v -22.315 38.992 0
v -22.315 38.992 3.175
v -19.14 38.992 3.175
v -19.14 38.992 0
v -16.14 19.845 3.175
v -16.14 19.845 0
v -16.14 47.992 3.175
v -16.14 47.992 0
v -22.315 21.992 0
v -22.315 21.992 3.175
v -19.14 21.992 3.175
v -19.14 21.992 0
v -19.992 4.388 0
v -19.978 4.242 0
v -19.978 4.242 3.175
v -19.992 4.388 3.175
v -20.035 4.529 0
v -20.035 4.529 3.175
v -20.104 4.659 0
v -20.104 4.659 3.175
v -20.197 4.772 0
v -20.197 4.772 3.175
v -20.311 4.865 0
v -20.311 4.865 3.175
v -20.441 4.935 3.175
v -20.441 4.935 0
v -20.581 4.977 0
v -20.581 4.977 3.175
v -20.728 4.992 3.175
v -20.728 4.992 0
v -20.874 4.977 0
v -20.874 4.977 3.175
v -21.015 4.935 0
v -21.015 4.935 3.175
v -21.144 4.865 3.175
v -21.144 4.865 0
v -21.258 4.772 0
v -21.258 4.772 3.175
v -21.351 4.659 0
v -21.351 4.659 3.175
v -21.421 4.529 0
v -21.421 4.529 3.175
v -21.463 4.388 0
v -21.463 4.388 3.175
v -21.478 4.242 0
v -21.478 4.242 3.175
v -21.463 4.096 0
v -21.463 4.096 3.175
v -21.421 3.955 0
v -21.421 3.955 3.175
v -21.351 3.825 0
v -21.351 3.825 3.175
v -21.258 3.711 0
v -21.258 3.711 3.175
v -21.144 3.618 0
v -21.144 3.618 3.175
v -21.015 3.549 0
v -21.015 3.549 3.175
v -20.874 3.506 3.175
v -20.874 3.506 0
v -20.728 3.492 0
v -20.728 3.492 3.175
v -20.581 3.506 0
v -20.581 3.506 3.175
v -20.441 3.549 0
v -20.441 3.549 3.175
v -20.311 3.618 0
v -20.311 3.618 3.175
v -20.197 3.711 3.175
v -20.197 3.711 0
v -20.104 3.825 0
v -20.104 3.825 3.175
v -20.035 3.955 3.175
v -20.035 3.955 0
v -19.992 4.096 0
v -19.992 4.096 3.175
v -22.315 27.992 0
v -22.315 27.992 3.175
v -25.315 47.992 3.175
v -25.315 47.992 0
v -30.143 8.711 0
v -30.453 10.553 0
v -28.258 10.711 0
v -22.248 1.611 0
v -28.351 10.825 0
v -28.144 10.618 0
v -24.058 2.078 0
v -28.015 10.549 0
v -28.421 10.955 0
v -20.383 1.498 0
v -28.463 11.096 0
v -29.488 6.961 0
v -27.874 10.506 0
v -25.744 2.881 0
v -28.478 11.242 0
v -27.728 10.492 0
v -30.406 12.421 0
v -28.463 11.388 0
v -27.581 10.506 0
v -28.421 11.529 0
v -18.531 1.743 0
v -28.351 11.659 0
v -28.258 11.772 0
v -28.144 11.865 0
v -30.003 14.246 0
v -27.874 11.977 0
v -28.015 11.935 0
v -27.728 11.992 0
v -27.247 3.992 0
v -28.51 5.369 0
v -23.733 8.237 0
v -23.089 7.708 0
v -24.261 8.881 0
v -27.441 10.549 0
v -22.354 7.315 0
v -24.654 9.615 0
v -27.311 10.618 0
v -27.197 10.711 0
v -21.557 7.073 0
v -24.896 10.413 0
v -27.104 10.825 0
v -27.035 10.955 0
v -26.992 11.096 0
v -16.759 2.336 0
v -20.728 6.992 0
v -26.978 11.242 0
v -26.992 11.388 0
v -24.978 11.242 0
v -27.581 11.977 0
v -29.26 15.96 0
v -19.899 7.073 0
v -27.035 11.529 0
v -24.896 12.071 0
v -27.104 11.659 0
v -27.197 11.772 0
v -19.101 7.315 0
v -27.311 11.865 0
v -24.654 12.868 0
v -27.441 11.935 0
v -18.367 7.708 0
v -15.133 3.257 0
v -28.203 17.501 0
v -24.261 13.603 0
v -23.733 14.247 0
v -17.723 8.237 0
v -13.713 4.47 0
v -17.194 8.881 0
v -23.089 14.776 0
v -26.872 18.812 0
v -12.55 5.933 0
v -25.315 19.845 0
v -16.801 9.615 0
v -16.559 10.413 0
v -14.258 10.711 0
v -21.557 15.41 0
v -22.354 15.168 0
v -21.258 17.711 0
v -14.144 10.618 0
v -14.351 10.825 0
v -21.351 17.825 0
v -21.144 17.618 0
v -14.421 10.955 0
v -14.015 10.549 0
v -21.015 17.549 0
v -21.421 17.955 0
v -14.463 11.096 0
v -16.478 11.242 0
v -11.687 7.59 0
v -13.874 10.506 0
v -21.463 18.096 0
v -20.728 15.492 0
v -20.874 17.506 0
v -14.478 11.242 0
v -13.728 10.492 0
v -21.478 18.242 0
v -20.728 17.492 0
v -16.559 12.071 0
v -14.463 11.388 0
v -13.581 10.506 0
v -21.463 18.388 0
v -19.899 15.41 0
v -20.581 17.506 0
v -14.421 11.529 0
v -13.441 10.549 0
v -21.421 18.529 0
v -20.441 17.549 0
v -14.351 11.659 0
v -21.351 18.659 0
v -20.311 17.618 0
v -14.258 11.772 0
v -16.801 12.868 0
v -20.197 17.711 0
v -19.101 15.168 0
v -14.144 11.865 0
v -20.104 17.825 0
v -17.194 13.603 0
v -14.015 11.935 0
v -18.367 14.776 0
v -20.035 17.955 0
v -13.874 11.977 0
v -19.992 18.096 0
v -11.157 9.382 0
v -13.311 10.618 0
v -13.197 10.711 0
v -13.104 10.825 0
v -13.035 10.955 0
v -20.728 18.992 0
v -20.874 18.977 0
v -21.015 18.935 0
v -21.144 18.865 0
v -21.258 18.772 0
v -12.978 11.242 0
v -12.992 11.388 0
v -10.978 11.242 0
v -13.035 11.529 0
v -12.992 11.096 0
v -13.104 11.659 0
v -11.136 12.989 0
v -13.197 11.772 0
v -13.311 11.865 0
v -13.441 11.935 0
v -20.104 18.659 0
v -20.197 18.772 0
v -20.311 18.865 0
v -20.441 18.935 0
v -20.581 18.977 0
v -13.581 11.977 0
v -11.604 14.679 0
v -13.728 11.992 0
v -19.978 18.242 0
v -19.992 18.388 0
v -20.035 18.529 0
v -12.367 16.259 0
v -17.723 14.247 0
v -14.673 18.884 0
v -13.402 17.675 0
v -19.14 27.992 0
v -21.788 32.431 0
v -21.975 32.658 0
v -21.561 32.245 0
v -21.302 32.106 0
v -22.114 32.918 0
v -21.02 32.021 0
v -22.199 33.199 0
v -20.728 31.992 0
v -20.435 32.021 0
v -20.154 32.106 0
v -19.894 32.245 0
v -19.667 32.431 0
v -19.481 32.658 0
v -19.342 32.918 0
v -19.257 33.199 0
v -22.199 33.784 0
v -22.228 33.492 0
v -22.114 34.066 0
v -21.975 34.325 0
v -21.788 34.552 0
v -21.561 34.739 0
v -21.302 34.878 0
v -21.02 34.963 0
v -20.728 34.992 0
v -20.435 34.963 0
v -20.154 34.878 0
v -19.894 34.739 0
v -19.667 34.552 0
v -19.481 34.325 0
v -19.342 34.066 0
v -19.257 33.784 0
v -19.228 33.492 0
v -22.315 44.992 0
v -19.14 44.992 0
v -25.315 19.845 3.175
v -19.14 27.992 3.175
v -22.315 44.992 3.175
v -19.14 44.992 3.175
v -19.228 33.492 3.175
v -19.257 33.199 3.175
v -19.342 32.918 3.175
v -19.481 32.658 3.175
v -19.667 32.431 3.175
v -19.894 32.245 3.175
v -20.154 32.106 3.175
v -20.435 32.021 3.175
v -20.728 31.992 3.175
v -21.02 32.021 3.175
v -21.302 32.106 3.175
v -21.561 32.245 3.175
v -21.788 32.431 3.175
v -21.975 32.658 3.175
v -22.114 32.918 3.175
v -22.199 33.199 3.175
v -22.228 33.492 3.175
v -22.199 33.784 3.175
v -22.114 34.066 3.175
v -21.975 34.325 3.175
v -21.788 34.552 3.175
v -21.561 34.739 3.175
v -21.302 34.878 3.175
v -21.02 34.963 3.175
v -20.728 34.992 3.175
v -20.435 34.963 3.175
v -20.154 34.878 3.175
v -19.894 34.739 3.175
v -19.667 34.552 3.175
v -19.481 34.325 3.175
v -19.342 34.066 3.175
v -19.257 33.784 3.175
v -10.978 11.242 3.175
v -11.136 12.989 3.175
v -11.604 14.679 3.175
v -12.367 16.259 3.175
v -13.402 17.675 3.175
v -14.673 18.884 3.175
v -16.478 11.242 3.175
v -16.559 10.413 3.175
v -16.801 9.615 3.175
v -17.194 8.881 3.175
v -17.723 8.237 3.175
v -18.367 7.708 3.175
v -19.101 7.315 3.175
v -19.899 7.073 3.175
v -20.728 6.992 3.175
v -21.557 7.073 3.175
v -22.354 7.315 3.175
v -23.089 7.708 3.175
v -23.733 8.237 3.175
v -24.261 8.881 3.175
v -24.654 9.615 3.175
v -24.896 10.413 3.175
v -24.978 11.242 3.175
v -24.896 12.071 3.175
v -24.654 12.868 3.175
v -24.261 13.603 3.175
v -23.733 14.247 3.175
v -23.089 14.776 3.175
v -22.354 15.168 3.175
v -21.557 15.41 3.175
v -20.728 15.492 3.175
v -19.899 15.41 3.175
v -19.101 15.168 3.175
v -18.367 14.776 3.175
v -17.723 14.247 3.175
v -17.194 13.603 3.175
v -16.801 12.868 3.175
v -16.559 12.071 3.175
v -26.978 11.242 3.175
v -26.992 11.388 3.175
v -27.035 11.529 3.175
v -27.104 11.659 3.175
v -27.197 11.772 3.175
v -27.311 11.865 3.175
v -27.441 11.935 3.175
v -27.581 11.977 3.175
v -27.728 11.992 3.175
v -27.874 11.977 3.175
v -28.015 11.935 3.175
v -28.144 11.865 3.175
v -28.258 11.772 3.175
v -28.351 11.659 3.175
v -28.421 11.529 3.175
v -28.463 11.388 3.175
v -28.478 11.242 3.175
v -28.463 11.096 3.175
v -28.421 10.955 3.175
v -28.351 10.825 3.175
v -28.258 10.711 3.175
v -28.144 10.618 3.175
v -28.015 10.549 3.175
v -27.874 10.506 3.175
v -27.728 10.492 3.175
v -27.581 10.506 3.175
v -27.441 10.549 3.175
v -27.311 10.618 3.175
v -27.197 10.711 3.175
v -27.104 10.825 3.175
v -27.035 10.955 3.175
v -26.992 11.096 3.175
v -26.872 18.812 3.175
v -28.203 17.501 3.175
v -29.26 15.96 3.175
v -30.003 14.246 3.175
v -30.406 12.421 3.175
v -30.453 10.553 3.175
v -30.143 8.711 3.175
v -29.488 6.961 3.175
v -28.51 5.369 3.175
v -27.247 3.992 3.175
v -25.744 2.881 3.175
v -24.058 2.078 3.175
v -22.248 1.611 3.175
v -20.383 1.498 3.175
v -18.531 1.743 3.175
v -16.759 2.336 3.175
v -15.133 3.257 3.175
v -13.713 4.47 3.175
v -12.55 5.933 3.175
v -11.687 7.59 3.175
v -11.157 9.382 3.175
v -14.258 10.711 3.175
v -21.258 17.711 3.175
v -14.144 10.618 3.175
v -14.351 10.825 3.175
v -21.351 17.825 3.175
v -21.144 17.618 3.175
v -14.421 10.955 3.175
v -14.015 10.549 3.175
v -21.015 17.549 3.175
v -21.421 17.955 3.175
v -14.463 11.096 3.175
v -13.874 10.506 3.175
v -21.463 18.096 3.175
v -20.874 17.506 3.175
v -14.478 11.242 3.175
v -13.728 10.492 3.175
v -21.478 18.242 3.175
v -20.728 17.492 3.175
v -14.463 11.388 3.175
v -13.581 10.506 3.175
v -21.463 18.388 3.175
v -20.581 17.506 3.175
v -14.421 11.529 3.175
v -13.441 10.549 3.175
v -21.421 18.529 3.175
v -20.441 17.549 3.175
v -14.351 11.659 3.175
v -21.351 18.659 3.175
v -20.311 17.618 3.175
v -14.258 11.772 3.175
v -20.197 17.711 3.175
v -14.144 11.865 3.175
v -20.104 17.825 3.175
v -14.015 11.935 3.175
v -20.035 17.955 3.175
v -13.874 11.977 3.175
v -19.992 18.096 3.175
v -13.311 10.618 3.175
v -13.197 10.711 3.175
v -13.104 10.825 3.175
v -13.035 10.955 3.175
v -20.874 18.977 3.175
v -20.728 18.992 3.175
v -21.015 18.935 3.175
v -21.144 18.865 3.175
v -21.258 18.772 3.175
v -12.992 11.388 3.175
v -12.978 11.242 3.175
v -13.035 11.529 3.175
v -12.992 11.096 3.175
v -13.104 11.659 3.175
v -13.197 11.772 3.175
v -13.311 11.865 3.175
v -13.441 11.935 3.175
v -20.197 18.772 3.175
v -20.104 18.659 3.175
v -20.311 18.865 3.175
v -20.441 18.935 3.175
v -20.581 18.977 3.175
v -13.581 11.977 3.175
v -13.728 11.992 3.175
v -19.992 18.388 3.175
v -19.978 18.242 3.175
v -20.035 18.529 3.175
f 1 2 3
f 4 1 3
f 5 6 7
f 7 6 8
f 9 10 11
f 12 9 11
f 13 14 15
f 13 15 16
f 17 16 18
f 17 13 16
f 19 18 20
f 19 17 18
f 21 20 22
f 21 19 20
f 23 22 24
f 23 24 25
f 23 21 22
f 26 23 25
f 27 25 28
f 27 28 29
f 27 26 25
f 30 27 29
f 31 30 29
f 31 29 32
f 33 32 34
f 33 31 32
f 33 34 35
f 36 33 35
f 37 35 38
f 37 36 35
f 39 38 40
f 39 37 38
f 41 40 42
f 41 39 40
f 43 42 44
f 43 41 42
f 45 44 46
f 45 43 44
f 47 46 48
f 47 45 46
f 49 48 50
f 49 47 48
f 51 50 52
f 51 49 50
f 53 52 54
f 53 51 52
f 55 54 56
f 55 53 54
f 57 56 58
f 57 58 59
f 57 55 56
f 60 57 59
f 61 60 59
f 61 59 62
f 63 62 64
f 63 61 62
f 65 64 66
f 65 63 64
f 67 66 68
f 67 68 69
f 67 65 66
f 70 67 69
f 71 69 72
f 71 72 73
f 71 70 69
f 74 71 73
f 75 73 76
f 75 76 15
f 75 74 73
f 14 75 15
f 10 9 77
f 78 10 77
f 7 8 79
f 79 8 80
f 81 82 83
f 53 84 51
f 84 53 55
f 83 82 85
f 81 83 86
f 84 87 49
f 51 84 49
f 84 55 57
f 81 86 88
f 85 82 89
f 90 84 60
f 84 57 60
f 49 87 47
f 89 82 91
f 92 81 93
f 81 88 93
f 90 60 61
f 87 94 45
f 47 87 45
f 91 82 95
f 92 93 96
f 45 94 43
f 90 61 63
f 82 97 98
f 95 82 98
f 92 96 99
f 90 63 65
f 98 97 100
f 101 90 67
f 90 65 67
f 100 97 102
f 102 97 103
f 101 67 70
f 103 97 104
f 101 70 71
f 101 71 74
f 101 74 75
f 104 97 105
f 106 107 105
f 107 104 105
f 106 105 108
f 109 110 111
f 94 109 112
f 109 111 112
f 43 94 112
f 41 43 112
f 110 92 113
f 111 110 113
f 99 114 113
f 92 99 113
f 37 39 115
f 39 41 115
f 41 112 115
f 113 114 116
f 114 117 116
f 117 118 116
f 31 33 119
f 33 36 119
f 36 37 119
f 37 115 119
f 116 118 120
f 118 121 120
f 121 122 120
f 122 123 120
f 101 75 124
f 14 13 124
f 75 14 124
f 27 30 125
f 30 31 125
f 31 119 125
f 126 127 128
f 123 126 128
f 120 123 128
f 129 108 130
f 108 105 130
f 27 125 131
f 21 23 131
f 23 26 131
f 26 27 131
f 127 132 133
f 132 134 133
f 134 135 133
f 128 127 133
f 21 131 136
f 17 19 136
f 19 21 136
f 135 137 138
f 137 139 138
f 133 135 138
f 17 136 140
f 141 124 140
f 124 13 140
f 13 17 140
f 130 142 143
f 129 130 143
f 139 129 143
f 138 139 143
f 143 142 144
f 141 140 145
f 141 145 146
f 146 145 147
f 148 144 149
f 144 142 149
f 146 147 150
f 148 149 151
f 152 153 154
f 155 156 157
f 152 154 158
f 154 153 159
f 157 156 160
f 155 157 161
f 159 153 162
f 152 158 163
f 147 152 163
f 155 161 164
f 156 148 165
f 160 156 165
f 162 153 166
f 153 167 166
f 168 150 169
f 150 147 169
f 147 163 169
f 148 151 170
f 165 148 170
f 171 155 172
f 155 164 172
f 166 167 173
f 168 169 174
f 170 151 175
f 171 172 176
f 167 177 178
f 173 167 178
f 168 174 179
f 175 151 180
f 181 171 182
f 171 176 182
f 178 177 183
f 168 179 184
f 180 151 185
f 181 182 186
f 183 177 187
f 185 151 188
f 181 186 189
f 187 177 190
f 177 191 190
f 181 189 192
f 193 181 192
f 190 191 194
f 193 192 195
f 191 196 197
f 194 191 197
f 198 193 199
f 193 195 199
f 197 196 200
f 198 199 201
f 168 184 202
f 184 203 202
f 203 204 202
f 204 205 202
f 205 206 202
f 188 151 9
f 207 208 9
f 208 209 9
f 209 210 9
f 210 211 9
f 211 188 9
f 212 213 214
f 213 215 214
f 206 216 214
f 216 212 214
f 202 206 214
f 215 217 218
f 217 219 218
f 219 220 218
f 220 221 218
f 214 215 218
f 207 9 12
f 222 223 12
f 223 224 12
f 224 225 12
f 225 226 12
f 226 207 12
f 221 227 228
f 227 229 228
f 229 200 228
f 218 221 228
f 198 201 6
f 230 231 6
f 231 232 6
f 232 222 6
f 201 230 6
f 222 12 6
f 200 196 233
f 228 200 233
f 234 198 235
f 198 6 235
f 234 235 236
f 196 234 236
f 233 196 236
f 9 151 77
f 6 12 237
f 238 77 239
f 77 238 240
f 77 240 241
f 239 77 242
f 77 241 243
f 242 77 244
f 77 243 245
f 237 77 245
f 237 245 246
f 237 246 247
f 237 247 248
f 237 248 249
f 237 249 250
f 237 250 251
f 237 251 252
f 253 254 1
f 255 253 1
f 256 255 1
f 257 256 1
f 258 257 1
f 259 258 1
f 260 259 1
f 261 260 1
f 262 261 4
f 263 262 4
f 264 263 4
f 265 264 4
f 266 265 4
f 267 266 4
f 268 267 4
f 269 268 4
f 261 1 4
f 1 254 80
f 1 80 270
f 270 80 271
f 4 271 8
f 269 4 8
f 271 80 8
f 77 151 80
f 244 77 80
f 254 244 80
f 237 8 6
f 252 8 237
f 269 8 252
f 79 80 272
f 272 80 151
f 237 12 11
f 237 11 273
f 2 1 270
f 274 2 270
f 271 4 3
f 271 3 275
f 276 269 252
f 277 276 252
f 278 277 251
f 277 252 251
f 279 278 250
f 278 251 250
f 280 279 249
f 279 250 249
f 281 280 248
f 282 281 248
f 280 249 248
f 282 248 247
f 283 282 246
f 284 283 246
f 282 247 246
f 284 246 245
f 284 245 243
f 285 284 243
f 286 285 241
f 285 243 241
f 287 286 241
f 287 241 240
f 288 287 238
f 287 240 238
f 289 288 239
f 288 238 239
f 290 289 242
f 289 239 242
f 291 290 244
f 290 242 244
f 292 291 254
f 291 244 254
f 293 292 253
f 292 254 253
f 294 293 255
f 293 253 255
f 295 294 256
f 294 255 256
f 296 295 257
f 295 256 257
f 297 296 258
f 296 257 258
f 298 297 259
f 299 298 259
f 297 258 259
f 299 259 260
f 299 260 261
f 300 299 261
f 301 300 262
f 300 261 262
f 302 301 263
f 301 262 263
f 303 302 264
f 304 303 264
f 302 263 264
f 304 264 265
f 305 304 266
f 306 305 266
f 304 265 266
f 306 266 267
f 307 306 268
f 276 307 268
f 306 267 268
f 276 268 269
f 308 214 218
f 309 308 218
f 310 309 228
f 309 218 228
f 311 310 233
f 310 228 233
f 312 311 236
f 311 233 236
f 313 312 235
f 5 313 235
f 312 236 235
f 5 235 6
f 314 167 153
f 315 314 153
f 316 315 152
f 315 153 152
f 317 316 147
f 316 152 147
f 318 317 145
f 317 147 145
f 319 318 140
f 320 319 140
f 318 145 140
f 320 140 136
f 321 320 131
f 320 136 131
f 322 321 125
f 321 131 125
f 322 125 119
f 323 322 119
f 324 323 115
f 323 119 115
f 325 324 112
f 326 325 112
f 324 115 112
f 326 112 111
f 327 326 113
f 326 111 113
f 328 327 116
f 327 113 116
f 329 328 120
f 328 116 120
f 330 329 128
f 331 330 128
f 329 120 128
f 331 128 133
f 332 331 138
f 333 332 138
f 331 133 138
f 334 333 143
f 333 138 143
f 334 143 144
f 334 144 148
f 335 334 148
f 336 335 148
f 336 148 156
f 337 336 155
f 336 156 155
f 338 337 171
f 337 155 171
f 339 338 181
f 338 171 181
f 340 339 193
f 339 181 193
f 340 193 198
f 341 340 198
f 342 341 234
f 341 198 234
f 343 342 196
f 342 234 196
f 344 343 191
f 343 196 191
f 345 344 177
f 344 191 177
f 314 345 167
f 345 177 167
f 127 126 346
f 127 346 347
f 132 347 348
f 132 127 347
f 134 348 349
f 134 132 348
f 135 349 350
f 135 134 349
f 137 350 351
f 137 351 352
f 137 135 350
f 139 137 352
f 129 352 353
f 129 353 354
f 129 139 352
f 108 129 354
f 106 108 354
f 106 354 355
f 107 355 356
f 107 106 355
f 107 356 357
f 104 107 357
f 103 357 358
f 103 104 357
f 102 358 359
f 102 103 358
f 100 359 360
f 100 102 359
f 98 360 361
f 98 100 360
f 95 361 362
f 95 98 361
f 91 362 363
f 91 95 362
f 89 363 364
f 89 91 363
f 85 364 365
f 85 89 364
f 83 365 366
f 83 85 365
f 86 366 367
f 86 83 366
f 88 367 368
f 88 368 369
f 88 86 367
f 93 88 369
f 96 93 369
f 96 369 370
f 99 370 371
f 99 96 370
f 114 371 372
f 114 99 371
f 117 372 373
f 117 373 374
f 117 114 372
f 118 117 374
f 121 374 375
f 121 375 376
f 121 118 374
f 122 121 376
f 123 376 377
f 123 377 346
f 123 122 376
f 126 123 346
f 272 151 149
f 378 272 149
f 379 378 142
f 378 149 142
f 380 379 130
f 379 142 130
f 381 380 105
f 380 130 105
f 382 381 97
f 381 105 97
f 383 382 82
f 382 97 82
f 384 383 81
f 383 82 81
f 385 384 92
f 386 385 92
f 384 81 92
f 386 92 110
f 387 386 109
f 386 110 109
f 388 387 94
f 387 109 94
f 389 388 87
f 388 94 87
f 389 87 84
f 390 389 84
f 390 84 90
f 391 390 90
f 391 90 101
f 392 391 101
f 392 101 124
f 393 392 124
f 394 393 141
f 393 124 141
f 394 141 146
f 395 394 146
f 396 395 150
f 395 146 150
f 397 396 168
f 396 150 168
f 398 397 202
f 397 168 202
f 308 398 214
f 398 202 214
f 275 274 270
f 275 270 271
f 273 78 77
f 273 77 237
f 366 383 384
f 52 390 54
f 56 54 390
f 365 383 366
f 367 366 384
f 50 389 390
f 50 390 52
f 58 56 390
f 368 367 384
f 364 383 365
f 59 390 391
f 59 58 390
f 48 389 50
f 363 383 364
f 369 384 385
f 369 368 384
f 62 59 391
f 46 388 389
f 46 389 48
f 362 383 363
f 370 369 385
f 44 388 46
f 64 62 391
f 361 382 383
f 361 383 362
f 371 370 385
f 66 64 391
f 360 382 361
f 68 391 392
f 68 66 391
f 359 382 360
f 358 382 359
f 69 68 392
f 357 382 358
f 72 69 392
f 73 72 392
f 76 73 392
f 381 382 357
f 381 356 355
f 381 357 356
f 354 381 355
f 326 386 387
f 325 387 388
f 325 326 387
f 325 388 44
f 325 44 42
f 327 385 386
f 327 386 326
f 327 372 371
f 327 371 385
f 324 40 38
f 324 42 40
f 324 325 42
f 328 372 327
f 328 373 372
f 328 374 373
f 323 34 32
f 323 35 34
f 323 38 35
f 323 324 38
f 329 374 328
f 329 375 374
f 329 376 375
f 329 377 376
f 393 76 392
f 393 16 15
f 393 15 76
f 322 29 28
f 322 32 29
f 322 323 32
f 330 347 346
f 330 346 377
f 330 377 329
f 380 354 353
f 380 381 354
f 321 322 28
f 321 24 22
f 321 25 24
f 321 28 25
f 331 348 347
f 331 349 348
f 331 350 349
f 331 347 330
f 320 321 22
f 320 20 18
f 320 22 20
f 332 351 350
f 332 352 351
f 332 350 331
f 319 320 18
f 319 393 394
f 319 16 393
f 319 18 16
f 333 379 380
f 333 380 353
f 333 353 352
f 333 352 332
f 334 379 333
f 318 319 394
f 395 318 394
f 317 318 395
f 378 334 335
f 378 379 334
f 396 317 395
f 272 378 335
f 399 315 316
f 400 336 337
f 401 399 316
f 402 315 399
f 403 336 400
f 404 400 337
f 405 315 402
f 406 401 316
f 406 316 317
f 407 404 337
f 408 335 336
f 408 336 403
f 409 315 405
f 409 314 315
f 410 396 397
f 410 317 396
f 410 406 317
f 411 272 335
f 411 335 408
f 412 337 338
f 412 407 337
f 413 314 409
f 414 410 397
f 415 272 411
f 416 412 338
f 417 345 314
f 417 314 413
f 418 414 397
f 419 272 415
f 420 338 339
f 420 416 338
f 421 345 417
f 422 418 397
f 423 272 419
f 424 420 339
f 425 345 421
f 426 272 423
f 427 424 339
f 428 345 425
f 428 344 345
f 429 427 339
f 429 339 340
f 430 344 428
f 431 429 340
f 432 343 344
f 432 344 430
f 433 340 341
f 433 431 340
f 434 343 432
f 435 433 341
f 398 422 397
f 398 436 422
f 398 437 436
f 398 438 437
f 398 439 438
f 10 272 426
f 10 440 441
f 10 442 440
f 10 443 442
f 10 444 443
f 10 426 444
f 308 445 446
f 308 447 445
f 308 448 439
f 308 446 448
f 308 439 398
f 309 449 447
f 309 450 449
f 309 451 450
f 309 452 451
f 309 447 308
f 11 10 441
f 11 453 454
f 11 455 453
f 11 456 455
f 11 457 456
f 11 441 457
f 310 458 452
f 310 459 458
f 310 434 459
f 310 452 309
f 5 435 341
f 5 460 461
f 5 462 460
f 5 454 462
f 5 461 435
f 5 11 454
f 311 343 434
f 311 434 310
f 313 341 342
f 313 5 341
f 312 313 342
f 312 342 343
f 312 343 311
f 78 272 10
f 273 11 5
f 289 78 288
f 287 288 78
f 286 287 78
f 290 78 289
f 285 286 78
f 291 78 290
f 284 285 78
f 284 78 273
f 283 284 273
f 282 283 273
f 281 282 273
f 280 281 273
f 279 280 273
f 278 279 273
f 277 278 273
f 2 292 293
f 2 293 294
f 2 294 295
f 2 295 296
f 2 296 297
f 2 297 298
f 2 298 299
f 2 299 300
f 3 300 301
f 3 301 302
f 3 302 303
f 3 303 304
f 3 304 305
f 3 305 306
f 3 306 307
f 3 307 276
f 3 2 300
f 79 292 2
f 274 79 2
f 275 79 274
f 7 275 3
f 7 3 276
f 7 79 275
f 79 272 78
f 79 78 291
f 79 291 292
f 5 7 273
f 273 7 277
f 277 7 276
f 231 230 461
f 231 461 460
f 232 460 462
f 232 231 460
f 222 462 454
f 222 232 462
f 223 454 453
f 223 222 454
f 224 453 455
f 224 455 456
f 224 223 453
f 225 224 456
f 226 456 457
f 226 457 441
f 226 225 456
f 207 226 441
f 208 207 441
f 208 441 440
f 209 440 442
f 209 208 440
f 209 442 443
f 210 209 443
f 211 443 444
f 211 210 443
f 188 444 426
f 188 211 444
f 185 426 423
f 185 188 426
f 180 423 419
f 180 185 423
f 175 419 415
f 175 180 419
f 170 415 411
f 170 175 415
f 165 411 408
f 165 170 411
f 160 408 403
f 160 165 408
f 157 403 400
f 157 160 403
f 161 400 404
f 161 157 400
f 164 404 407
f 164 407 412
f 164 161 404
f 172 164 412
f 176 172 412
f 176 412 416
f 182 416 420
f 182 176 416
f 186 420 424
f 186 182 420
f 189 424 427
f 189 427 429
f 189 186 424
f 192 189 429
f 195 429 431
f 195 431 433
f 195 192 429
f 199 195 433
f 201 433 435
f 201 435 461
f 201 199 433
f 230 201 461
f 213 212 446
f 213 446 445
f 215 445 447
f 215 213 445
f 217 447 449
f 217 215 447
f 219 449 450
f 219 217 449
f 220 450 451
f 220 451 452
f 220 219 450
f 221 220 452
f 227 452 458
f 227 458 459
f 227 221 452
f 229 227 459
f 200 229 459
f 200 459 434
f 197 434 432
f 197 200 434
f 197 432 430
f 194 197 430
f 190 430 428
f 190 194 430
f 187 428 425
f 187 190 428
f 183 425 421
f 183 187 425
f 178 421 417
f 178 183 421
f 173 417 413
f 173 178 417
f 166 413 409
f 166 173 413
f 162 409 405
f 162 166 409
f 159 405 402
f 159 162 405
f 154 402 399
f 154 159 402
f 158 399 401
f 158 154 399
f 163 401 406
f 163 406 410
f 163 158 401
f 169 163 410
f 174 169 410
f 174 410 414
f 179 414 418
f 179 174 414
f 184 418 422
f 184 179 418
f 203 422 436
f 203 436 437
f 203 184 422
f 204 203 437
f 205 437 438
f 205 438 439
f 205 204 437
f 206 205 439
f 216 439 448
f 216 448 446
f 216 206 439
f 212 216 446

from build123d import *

# Parameters (mm, degrees)
F0_W     = 3.175
F0_H     = 6
F0_R     = 0.75
F1_DEPTH = 3.175


# Not quite as in the source:
# - a length typed as a fraction of an inch, garbled in the dataset ("3 / 203.2 mm" for 3/8 in), is restored


with BuildPart() as f1:
    # F0 (on Top) → F1 (new body)
    with BuildSketch(Plane.XY):
        with BuildLine():
            ThreePointArc((-25.3152321216, 19.8451589555), (-20.7277321216, 20.9918256626), (-16.1402321216, 19.8451589555))
            Line((-16.1402321216, 19.8451589555), (-16.1402321216, 47.9918256626))
            Line((-16.1402321216, 47.9918256626), (-25.3152321216, 47.9918256626))
            Line((-25.3152321216, 47.9918256626), (-25.3152321216, 19.8451589555))
        make_face()
        with Locations((-20.7277321216, 24.9918256626)):
            Rectangle(F0_W, F0_H, mode=Mode.SUBTRACT)
        with BuildLine():
            ThreePointArc((-22.2277321216, 33.4918256626), (-20.7277321216, 34.9918256626), (-19.2277321216, 33.4918256626))
            ThreePointArc((-19.2277321216, 33.4918256626), (-20.7277321216, 31.9918256626), (-22.2277321216, 33.4918256626))
        make_face(mode=Mode.SUBTRACT)
        with Locations((-20.7277321216, 41.9918256626)):
            Rectangle(F0_W, F0_H, mode=Mode.SUBTRACT)
        with BuildLine():
            ThreePointArc((-25.3152321216, 19.8451589555), (-25.744423013, 2.8814840128), (-10.9777321216, 11.2418256626))
            ThreePointArc((-10.9777321216, 11.2418256626), (-12.3673904719, 16.258516554), (-16.1402321216, 19.8451589555))
            ThreePointArc((-16.1402321216, 19.8451589555), (-20.7277321216, 20.9918256626), (-25.3152321216, 19.8451589555))
        make_face()
        with Locations((-27.7277321216, 11.2418256626)):
            Circle(F0_R, mode=Mode.SUBTRACT)
        with Locations((-20.7277321216, 4.2418256626)):
            Circle(F0_R, mode=Mode.SUBTRACT)
        with BuildLine():
            ThreePointArc((-20.7277321216, 6.9918256626), (-23.7329359416, 14.2470294826), (-16.4777321216, 11.2418256626))
            ThreePointArc((-16.4777321216, 11.2418256626), (-17.7225283015, 8.2366218425), (-20.7277321216, 6.9918256626))
        make_face(mode=Mode.SUBTRACT)
        with Locations((-13.7277321216, 11.2418256626)):
            Circle(F0_R, mode=Mode.SUBTRACT)
        with Locations((-20.7277321216, 18.2418256626)):
            Circle(F0_R, mode=Mode.SUBTRACT)
    extrude(amount=F1_DEPTH)


solid = f1.part
